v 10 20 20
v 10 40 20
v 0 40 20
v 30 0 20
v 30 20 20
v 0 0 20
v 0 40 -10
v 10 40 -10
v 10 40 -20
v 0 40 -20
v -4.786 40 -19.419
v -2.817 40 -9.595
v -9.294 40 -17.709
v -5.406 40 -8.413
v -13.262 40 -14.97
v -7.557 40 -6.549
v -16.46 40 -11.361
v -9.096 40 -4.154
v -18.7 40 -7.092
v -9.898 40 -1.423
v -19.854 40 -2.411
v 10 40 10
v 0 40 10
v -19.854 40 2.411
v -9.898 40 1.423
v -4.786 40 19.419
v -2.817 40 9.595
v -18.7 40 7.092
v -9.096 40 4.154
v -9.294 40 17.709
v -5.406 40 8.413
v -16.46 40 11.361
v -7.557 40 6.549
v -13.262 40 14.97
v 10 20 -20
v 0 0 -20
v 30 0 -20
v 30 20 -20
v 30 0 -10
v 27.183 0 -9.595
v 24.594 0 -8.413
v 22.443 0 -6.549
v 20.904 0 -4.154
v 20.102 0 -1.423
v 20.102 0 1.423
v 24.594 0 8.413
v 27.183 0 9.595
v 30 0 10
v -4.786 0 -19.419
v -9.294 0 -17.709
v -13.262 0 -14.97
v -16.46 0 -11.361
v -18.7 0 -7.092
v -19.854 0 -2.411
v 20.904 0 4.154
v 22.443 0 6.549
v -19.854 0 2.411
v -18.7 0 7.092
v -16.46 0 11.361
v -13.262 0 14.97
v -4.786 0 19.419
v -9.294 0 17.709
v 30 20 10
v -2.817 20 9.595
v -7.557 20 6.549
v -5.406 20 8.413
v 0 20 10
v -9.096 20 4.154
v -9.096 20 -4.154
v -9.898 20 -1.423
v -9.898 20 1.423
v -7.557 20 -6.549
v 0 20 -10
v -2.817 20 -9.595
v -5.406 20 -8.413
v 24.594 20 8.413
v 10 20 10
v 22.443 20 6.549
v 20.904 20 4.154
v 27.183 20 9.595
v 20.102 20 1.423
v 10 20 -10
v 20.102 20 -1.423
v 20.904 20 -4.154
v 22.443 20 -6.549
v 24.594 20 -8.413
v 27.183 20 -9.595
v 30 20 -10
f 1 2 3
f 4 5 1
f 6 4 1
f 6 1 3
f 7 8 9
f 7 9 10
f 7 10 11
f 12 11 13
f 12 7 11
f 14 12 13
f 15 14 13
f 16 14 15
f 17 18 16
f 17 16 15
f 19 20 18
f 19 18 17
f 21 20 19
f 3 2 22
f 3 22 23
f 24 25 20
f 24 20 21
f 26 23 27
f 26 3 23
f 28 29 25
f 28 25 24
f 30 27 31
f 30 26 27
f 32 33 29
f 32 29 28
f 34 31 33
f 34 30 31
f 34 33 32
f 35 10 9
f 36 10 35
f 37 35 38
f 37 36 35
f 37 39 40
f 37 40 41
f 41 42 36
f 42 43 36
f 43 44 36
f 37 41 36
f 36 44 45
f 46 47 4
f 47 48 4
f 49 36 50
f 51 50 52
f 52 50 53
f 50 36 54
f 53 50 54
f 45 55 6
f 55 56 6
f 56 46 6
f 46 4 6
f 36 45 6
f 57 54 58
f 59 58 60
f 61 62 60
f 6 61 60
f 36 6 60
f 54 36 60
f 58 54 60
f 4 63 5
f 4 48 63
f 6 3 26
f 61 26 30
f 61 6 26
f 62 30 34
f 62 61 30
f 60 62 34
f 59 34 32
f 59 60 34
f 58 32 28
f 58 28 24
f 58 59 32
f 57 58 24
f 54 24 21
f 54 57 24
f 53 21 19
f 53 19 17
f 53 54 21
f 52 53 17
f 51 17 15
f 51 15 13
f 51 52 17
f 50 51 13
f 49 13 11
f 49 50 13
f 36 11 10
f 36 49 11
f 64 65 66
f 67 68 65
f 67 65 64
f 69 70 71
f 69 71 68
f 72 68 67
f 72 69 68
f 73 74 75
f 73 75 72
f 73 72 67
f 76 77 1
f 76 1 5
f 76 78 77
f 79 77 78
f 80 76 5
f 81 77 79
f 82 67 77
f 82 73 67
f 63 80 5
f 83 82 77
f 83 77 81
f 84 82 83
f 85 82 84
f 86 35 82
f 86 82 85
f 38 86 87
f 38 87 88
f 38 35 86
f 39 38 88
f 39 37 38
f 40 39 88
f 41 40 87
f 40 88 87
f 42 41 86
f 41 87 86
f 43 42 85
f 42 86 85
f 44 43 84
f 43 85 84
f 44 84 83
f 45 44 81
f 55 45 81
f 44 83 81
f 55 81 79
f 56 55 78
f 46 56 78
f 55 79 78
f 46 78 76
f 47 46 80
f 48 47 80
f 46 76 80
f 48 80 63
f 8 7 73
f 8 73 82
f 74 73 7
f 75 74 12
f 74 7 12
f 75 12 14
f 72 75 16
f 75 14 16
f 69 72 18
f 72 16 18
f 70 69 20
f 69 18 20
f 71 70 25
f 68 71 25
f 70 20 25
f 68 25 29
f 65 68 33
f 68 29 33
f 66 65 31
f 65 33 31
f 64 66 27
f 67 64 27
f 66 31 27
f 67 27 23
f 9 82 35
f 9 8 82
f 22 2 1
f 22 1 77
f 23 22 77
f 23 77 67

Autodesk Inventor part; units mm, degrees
ref_plane "YZ Plane" through (0, 0, 0) normal (1, 0, 0) x (0, 1, 0)
ref_plane "XZ Plane" through (0, 0, 0) normal (0, 1, 0) x (-1, 0, 0)
ref_plane "XY Plane" through (0, 0, 0) normal (0, 0, 1) x (1, 0, 0)
sketch "草圖1" plane through (0, 0, 0) normal (0, 1, 0) x (-1, 0, 0)
  circle A0 centre (0, 0) radius 20
  line L0 (0, -20) -> (-30, -20)
  line L1 (-30, -20) -> (-30, 20)
  line L2 (-30, 20) -> (0, 20)
  line L3 (0, 20) -> (0, -20)
  point P0 (0, 20)
  dimension "d0" = 40
  dimension "d1" = 30
extrude "擠出1" add sketch "草圖1" along normal blind 40
sketch "草圖2" plane through (0, 40, 0) normal (0, 1, 0) x (1, 0, 0)
  line L0 (30, -20) -> (0, -20) projected
  arc A0 (0, 20) -> (0, -20) centre (0, 0) ccw projected
  line L1 (0, 20) -> (30, 20) projected
  line L2 (30, 20) -> (30, -20) projected
  line L3 (10, 20) -> (30, 20)
  line L4 (30, 20) -> (30, -20)
  line L5 (30, -20) -> (10, -20)
  line L6 (10, -20) -> (10, 20)
  line L7 (30, -20) -> (30, 20) projected
  line L8 (30, 20) -> (0, 20) projected
  line L9 (0, -20) -> (30, -20) projected
  line L10 (0, 10) -> (10, 10)
  line L11 (10, 10) -> (10, -10)
  line L12 (10, -10) -> (0, -10)
  line L13 (0, -10) -> (0, 10)
  circle A1 centre (0, 0) radius 10
  point P0 (10, 0)
  point P1 (0, -10)
  dimension "d4" = 20
  dimension "d5" = 20
  dimension "d6" = 10
extrude "擠出2" cut sketch "草圖2" against normal blind 20 contours L0 L6 L1 L2 | L12 A1 L6 | A1 L10 L6 | A1 L13 | A1 L13
sketch "草圖3" plane through (0, 20, 0) normal (0, 1, 0) x (1, 0, 0)
  line L0 (10, 20) -> (10, 10) projected
  line L1 (10, 10) -> (0, 10) projected
  arc A0 (0, 10) -> (0, -10) centre (0, 0) ccw projected
  line L2 (0, -10) -> (10, -10) projected
  line L3 (10, -10) -> (10, -20) projected
  line L4 (30, -20) -> (10, -20) projected
  line L5 (30, 20) -> (30, -20) projected
  line L6 (10, 20) -> (30, 20) projected
  line L7 (0, 20) -> (10, 20) projected
  arc A1 (0, 20) -> (0, -20) centre (0, 0) ccw projected
  line L8 (10, -20) -> (0, -20) projected
  circle A2 centre (30, 0) radius 10
  dimension "d9" = 20
extrude "擠出3" cut sketch "草圖3" against normal through all contours A2 L5 | L5 A2
properties part number "29" material "鋼、碳鋼"
